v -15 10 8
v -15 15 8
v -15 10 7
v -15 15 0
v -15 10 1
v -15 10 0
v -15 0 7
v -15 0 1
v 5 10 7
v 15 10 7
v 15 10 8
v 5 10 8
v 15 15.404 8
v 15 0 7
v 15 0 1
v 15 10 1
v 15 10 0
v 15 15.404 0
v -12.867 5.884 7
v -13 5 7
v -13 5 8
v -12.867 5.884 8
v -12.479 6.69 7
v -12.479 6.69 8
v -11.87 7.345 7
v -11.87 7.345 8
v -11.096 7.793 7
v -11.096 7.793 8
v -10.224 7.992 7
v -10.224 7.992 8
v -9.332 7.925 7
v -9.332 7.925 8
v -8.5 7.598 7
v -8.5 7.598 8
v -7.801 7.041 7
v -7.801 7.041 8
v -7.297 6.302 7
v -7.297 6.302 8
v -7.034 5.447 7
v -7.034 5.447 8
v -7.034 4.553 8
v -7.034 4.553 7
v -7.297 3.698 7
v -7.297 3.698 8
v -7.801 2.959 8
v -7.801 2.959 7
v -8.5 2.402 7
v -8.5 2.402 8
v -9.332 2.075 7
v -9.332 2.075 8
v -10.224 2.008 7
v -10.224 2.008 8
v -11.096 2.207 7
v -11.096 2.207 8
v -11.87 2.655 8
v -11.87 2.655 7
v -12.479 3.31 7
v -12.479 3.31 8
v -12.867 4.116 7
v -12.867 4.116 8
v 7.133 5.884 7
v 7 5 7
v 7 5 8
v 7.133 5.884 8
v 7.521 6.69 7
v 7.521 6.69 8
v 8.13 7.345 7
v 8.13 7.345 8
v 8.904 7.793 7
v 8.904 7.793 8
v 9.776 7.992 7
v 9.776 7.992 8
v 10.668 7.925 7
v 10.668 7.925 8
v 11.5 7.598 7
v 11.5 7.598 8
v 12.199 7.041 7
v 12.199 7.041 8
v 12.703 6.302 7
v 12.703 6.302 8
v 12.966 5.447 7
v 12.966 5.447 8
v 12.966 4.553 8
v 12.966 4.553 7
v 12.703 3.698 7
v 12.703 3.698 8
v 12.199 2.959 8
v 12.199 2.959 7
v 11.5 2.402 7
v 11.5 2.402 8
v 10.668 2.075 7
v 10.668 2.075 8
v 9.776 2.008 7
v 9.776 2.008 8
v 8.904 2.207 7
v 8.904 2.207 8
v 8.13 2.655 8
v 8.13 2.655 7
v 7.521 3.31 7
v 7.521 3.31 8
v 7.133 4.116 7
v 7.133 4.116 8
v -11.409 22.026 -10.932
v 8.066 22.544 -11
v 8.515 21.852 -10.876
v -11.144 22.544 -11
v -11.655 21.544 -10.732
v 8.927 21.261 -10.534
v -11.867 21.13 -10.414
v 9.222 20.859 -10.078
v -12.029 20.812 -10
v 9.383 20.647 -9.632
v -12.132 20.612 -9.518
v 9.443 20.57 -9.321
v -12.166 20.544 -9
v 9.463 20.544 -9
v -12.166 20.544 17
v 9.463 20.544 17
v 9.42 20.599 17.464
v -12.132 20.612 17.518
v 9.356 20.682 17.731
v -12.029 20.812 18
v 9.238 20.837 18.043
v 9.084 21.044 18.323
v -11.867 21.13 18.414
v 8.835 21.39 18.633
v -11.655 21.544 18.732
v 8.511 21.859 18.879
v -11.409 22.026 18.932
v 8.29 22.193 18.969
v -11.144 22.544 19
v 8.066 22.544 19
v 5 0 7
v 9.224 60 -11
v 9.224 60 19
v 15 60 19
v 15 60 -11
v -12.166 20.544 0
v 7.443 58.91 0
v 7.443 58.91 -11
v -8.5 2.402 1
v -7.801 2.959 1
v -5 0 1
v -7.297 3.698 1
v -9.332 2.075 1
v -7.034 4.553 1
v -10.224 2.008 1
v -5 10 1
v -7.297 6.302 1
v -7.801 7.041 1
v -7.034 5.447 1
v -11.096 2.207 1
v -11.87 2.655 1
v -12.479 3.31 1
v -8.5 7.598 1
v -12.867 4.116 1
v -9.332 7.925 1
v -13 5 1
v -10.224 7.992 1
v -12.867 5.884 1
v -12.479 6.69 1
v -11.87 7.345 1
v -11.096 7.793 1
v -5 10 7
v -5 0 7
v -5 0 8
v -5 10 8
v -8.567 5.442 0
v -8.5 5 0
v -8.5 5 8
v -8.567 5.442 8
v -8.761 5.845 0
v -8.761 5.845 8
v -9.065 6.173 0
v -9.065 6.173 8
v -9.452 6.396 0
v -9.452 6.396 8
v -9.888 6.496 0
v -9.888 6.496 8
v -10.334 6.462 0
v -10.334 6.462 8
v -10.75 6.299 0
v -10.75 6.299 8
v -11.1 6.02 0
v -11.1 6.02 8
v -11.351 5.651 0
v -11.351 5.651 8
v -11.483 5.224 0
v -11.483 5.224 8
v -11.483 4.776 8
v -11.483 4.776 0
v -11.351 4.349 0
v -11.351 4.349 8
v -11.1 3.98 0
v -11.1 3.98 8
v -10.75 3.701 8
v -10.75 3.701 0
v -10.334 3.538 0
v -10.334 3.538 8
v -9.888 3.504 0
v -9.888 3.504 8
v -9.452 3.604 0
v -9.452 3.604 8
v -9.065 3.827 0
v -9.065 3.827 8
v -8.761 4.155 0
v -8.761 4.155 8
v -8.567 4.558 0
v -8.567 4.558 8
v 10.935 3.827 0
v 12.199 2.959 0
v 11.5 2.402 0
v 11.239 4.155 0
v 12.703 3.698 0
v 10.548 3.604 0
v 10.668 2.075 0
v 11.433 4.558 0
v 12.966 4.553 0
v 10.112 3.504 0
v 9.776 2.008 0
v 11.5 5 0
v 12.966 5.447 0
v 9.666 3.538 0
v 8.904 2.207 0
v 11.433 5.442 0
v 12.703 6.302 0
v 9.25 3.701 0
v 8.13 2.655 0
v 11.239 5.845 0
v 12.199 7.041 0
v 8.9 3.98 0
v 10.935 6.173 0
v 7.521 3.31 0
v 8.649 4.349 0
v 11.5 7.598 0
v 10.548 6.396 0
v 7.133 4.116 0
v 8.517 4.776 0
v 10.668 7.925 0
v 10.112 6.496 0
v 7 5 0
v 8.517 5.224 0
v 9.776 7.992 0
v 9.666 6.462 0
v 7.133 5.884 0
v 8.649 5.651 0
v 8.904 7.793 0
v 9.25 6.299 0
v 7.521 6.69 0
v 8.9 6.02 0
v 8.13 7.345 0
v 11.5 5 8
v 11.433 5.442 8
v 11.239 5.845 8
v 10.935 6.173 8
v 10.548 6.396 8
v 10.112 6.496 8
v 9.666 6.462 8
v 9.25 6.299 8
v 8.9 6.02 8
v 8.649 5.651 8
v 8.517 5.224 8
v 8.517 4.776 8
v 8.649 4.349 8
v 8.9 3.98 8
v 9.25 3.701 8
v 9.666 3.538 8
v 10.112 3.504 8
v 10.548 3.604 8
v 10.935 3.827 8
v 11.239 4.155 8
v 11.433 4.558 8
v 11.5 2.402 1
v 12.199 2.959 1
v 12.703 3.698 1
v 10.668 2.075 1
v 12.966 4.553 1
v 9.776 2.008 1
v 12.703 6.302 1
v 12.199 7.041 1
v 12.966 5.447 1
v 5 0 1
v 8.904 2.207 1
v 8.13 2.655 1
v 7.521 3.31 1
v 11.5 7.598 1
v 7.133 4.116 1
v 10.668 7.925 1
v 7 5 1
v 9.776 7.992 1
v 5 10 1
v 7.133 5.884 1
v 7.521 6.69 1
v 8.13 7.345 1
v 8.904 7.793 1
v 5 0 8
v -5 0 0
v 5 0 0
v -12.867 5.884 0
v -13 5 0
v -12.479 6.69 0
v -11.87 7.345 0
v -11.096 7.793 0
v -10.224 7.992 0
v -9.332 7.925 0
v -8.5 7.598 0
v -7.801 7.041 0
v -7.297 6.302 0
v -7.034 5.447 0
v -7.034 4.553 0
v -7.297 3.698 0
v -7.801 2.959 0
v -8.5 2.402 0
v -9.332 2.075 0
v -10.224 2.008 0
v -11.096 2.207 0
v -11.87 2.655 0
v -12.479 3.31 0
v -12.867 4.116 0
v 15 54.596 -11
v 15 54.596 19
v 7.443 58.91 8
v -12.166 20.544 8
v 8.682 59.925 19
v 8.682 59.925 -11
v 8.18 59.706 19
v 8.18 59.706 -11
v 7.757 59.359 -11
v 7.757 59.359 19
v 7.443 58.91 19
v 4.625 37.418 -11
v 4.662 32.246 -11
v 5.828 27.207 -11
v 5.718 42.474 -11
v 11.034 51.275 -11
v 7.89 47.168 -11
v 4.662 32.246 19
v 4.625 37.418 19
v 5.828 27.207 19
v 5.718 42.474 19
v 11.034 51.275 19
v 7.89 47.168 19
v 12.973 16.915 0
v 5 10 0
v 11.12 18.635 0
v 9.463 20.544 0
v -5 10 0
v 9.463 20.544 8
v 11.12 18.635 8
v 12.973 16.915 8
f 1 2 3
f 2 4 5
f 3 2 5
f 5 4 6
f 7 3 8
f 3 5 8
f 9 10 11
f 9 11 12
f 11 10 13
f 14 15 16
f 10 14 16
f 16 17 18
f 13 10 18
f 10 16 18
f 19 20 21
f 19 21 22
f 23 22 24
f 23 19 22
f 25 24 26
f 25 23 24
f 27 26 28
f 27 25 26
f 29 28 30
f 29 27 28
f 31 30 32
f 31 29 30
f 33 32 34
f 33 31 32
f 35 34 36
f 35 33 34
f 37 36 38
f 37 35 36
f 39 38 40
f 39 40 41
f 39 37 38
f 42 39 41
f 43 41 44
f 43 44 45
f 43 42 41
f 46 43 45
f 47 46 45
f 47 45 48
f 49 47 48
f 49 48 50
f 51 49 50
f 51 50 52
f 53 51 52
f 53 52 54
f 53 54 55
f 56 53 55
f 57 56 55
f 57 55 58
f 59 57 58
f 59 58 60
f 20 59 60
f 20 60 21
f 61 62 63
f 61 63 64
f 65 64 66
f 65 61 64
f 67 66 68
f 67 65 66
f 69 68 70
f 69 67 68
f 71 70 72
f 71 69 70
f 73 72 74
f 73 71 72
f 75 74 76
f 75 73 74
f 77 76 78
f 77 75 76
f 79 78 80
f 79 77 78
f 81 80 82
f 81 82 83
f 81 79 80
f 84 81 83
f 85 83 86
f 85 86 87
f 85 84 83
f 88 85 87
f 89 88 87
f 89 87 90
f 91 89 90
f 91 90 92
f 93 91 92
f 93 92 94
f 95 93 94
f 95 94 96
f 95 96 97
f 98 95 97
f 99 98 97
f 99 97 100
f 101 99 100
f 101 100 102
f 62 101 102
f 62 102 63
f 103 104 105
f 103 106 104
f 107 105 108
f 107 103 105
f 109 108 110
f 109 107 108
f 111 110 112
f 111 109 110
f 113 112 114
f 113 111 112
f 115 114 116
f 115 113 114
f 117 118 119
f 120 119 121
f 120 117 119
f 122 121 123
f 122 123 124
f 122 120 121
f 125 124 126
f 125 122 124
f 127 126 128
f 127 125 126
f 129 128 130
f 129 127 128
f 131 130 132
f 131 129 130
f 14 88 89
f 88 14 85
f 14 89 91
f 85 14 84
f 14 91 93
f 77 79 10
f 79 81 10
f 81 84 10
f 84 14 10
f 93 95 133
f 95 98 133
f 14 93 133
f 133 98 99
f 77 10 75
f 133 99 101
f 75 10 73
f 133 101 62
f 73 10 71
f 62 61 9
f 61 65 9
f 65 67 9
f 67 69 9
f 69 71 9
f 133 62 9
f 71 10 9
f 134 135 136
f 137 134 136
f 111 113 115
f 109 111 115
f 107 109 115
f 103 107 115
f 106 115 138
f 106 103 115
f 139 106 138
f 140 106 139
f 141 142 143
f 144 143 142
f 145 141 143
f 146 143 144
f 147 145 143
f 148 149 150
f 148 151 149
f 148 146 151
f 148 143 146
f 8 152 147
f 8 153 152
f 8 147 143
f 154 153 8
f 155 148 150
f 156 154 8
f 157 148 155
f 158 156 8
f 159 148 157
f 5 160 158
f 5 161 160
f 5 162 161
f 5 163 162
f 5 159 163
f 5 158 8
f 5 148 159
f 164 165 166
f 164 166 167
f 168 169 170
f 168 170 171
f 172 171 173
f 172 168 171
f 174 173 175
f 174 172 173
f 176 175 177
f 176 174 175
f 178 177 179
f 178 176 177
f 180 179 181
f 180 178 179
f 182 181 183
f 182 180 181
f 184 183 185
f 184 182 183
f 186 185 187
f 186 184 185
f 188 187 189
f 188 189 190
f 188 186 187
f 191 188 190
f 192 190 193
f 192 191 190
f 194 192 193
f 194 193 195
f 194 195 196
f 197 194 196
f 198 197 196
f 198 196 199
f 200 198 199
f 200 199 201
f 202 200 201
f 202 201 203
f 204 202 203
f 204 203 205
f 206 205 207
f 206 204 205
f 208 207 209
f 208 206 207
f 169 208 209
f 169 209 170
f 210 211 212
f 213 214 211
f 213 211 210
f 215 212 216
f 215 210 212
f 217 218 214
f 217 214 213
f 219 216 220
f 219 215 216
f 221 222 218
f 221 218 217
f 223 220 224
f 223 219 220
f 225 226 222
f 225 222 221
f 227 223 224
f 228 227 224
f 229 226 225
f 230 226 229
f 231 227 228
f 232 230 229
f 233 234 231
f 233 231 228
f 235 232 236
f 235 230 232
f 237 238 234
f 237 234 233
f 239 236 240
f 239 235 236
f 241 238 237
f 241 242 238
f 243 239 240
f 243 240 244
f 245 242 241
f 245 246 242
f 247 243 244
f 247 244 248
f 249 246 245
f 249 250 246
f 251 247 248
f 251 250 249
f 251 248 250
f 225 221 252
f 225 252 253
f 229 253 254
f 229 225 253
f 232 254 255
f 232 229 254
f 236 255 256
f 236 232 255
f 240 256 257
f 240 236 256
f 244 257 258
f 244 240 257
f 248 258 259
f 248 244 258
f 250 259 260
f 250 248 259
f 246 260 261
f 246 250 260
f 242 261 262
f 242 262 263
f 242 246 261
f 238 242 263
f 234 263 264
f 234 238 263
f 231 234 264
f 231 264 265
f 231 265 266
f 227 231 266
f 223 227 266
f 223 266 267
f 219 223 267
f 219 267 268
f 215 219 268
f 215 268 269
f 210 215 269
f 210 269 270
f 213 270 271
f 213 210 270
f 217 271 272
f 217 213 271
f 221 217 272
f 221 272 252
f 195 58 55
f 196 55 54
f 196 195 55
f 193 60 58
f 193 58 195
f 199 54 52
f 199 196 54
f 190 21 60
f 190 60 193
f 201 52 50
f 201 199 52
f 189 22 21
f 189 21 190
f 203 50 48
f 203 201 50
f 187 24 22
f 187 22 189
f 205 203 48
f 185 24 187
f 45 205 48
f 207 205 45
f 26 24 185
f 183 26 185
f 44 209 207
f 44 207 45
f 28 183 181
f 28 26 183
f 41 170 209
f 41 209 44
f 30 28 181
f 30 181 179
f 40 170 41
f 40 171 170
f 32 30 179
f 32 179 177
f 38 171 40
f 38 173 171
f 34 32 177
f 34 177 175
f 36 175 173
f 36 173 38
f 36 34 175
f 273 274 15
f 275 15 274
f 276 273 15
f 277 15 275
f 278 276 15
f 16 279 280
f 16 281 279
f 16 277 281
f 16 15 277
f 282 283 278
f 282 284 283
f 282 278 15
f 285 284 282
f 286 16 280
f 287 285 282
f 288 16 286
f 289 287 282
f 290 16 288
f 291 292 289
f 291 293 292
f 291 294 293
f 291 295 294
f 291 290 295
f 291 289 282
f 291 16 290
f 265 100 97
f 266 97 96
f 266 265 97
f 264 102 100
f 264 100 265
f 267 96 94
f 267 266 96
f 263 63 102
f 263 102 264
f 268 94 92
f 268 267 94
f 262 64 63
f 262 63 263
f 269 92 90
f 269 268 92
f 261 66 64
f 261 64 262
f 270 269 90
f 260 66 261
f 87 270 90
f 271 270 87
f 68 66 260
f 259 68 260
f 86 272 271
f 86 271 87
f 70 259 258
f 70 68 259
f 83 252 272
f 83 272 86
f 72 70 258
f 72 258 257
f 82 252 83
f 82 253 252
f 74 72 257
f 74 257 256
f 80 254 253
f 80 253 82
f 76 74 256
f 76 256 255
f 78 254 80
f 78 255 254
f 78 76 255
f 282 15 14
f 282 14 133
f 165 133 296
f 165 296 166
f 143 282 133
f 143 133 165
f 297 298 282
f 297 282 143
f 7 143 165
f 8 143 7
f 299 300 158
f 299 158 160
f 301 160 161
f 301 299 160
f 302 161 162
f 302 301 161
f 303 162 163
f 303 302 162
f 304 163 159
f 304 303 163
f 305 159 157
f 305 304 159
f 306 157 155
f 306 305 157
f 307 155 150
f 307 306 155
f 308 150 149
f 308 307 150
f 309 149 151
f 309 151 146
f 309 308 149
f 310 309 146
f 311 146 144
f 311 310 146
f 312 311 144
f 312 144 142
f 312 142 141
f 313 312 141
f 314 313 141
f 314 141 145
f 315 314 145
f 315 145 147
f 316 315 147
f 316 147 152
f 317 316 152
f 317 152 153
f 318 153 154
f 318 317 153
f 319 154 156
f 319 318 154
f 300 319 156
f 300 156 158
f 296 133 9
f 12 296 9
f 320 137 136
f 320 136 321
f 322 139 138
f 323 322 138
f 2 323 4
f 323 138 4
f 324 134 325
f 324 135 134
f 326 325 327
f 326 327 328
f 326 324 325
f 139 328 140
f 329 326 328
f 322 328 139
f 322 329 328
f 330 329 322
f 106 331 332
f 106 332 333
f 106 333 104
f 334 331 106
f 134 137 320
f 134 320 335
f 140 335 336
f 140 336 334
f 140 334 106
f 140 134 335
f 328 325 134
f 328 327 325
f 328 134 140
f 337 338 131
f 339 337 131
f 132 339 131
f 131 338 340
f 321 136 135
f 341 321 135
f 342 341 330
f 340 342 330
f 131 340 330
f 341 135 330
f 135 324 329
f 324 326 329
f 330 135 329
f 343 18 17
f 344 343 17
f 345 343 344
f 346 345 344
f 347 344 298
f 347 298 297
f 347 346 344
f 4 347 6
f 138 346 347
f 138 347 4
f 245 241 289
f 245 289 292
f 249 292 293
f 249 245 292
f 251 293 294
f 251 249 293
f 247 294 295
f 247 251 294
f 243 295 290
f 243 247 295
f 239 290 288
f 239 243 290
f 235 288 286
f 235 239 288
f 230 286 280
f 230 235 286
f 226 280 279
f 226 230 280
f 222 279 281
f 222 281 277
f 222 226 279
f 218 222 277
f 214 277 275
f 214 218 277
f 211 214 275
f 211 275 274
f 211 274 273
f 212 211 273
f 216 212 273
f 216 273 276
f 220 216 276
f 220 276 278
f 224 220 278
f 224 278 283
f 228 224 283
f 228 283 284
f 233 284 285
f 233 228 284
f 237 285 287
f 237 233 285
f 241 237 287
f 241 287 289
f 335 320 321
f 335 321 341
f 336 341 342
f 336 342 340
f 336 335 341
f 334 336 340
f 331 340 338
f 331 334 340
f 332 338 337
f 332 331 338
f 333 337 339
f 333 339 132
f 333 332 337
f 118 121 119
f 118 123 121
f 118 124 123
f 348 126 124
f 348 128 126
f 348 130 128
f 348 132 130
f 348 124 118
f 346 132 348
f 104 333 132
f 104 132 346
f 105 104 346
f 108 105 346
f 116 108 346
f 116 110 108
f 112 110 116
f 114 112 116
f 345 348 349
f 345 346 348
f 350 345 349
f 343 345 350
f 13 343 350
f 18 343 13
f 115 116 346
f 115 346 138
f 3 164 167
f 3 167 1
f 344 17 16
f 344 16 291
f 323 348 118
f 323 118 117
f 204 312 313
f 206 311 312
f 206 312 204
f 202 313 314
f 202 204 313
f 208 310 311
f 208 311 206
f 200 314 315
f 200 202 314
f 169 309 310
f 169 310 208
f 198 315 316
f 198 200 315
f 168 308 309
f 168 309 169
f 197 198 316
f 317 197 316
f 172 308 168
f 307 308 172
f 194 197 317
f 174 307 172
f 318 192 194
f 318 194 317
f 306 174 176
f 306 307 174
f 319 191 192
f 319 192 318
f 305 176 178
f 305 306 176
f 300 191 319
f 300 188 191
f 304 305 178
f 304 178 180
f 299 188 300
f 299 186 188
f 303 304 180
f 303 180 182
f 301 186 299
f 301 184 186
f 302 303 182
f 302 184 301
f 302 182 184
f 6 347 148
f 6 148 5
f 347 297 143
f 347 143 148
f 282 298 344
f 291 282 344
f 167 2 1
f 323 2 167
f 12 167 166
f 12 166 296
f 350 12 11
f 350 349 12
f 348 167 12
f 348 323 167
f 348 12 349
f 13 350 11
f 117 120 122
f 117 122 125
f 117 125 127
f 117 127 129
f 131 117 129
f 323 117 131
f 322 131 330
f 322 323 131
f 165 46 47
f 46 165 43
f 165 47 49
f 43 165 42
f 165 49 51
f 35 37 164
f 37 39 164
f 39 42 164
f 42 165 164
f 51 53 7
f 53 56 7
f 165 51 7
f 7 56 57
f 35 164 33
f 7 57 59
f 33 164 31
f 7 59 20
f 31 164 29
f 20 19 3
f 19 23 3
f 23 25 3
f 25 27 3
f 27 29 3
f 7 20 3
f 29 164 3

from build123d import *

# Parameters (mm, degrees)
SKETCH_1_R           = 1.5
EXTRUDE_1_DEPTH      = 8
EXTRUDE_2_DEPTH      = 19
EXTRUDE_2_DEPTH_BACK = 11
FILLET_1_R           = 2
FILLET_2_R           = 2
FILLET_4_R           = 2
FILLET_5_R           = 2
SKETCH_3_W           = 10
SKETCH_3_H           = 10
SKETCH_3_R           = 3
CUT_EXTRUDE_1_DEPTH  = 8
SKETCH_3_2_W         = 10
SKETCH_3_2_H         = 10
SKETCH_3_2_R         = 3
EXTRUDE_3_DEPTH      = 7
SKETCH_3_3_W         = 10
SKETCH_3_3_H         = 10
SKETCH_3_3_R         = 3
CUT_EXTRUDE_2_DEPTH  = 1


with BuildPart() as part:
    # 草图1 → 凸台-拉伸1 (new body)
    with BuildSketch(Plane.XY):
        with BuildLine():
            Line((-15, 0), (15, 0))
            Line((15, 0), (15, 15.404082058))
            ThreePointArc((15, 15.404082058), (4.5, 35), (15, 54.595917942))
            Line((15, 54.595917942), (15, 60))
            Line((15, 60), (8, 60))
            Line((8, 60), (-15, 15))
            Line((-15, 15), (-15, 0))
        make_face()
        with Locations((-10, 5)):
            Circle(SKETCH_1_R, mode=Mode.SUBTRACT)
        with Locations((10, 5)):
            Circle(SKETCH_1_R, mode=Mode.SUBTRACT)
    extrude(amount=EXTRUDE_1_DEPTH)

    # 草图2 → 凸台-拉伸2 (add, two sides: drawn at the far end of the back side and taken through both)
    with BuildSketch(Plane.XY.offset(-EXTRUDE_2_DEPTH_BACK)):
        with BuildLine():
            Line((-12.166399205, 20.544001556), (8, 60))
            Line((8, 60), (15, 60))
            Line((15, 60), (15, 54.595917942))
            ThreePointArc((15, 54.595917942), (4.805132127, 38.777552052), (9.462778171, 20.544001556))
            Line((9.462778171, 20.544001556), (-12.166399205, 20.544001556))
        make_face()
    extrude(amount=EXTRUDE_2_DEPTH + EXTRUDE_2_DEPTH_BACK)

    # 圆角1
    fillet_1_edges = [part.edges().sort_by_distance(p)[0] for p in [
        (-1.351810517, 20.544001556, 19),
    ]]
    fillet(fillet_1_edges, radius=FILLET_1_R)

    # 圆角2
    fillet_2_edges = [part.edges().sort_by_distance(p)[0] for p in [
        (-1.351810517, 20.544001556, -11),
    ]]
    fillet(fillet_2_edges, radius=FILLET_2_R)

    # 圆角4
    fillet_4_edges = [part.edges().sort_by_distance(p)[0] for p in [
        (8, 60, 4),
    ]]
    fillet(fillet_4_edges, radius=FILLET_4_R)

    # 圆角5
    fillet_5_edges = [part.edges().sort_by_distance(p)[0] for p in [
        (15, 0, 4),
        (-15, 0, 4),
    ]]
    fillet(fillet_5_edges, radius=FILLET_5_R)

    # 草图3 → 切除-拉伸1 (cut)
    # profile 1 of 2: a face of its own
    with BuildSketch(Plane(origin=(0, 0, 0), x_dir=(-1, 0, 0), z_dir=(0, 0, -1))):
        with Locations((-10, 5)):
            Rectangle(SKETCH_3_W, SKETCH_3_H)
        with Locations((-10, 5)):
            Circle(SKETCH_3_R, mode=Mode.SUBTRACT)
    # profile 2 of 2: a face of its own
    with BuildSketch(Plane(origin=(0, 0, 0), x_dir=(-1, 0, 0), z_dir=(0, 0, -1))):
        with Locations((10, 5)):
            Rectangle(SKETCH_3_W, SKETCH_3_H)
        with Locations((10, 5)):
            Circle(SKETCH_3_R, mode=Mode.SUBTRACT)
    extrude(amount=-CUT_EXTRUDE_1_DEPTH, mode=Mode.SUBTRACT)


with BuildPart() as cut_extrude_1_piece_1:
    # of the separate pieces the step leaves, piece 1, a body of its own (cut_extrude_1_pieces)
    add(part.part.solids().sort_by_distance((-12.166399205, 20.544001556, 0))[0])



with BuildPart() as cut_extrude_1_piece_2:
    # of the separate pieces the step leaves, piece 2, a body of its own (cut_extrude_1_pieces)
    add(part.part.solids().sort_by_distance((-13, 5, 0))[0])


with BuildPart() as cut_extrude_1_piece_3:
    # of the separate pieces the step leaves, piece 3, a body of its own (cut_extrude_1_pieces)
    add(part.part.solids().sort_by_distance((7, 5, 0))[0])


with BuildPart() as cut_extrude_1_piece_1_1:
    add(cut_extrude_1_piece_1.part)

    add(cut_extrude_1_piece_2.part)  # 凸台-拉伸3 merges 切除-拉伸1 piece 2

    add(cut_extrude_1_piece_3.part)  # 凸台-拉伸3 merges 切除-拉伸1 piece 3
    # 草图3<2> → 凸台-拉伸3 (add)
    # profile 1 of 2: a face of its own
    with BuildSketch(Plane(origin=(0, 0, 0), x_dir=(-1, 0, 0), z_dir=(0, 0, -1))):
        with Locations((-10, 5)):
            Rectangle(SKETCH_3_2_W, SKETCH_3_2_H)
        with Locations((-10, 5)):
            Circle(SKETCH_3_2_R, mode=Mode.SUBTRACT)
    # profile 2 of 2: a face of its own
    with BuildSketch(Plane(origin=(0, 0, 0), x_dir=(-1, 0, 0), z_dir=(0, 0, -1))):
        with Locations((10, 5)):
            Rectangle(SKETCH_3_2_W, SKETCH_3_2_H)
        with Locations((10, 5)):
            Circle(SKETCH_3_2_R, mode=Mode.SUBTRACT)
    extrude(amount=-EXTRUDE_3_DEPTH)

    # 草图3<3> → 切除-拉伸2 (cut)
    # profile 1 of 2: a face of its own
    with BuildSketch(Plane(origin=(0, 0, 0), x_dir=(-1, 0, 0), z_dir=(0, 0, -1))):
        with Locations((-10, 5)):
            Rectangle(SKETCH_3_3_W, SKETCH_3_3_H)
        with Locations((-10, 5)):
            Circle(SKETCH_3_3_R, mode=Mode.SUBTRACT)
    # profile 2 of 2: a face of its own
    with BuildSketch(Plane(origin=(0, 0, 0), x_dir=(-1, 0, 0), z_dir=(0, 0, -1))):
        with Locations((10, 5)):
            Rectangle(SKETCH_3_3_W, SKETCH_3_3_H)
        with Locations((10, 5)):
            Circle(SKETCH_3_3_R, mode=Mode.SUBTRACT)
    extrude(amount=-CUT_EXTRUDE_2_DEPTH, mode=Mode.SUBTRACT)


solid = cut_extrude_1_piece_1_1.part
